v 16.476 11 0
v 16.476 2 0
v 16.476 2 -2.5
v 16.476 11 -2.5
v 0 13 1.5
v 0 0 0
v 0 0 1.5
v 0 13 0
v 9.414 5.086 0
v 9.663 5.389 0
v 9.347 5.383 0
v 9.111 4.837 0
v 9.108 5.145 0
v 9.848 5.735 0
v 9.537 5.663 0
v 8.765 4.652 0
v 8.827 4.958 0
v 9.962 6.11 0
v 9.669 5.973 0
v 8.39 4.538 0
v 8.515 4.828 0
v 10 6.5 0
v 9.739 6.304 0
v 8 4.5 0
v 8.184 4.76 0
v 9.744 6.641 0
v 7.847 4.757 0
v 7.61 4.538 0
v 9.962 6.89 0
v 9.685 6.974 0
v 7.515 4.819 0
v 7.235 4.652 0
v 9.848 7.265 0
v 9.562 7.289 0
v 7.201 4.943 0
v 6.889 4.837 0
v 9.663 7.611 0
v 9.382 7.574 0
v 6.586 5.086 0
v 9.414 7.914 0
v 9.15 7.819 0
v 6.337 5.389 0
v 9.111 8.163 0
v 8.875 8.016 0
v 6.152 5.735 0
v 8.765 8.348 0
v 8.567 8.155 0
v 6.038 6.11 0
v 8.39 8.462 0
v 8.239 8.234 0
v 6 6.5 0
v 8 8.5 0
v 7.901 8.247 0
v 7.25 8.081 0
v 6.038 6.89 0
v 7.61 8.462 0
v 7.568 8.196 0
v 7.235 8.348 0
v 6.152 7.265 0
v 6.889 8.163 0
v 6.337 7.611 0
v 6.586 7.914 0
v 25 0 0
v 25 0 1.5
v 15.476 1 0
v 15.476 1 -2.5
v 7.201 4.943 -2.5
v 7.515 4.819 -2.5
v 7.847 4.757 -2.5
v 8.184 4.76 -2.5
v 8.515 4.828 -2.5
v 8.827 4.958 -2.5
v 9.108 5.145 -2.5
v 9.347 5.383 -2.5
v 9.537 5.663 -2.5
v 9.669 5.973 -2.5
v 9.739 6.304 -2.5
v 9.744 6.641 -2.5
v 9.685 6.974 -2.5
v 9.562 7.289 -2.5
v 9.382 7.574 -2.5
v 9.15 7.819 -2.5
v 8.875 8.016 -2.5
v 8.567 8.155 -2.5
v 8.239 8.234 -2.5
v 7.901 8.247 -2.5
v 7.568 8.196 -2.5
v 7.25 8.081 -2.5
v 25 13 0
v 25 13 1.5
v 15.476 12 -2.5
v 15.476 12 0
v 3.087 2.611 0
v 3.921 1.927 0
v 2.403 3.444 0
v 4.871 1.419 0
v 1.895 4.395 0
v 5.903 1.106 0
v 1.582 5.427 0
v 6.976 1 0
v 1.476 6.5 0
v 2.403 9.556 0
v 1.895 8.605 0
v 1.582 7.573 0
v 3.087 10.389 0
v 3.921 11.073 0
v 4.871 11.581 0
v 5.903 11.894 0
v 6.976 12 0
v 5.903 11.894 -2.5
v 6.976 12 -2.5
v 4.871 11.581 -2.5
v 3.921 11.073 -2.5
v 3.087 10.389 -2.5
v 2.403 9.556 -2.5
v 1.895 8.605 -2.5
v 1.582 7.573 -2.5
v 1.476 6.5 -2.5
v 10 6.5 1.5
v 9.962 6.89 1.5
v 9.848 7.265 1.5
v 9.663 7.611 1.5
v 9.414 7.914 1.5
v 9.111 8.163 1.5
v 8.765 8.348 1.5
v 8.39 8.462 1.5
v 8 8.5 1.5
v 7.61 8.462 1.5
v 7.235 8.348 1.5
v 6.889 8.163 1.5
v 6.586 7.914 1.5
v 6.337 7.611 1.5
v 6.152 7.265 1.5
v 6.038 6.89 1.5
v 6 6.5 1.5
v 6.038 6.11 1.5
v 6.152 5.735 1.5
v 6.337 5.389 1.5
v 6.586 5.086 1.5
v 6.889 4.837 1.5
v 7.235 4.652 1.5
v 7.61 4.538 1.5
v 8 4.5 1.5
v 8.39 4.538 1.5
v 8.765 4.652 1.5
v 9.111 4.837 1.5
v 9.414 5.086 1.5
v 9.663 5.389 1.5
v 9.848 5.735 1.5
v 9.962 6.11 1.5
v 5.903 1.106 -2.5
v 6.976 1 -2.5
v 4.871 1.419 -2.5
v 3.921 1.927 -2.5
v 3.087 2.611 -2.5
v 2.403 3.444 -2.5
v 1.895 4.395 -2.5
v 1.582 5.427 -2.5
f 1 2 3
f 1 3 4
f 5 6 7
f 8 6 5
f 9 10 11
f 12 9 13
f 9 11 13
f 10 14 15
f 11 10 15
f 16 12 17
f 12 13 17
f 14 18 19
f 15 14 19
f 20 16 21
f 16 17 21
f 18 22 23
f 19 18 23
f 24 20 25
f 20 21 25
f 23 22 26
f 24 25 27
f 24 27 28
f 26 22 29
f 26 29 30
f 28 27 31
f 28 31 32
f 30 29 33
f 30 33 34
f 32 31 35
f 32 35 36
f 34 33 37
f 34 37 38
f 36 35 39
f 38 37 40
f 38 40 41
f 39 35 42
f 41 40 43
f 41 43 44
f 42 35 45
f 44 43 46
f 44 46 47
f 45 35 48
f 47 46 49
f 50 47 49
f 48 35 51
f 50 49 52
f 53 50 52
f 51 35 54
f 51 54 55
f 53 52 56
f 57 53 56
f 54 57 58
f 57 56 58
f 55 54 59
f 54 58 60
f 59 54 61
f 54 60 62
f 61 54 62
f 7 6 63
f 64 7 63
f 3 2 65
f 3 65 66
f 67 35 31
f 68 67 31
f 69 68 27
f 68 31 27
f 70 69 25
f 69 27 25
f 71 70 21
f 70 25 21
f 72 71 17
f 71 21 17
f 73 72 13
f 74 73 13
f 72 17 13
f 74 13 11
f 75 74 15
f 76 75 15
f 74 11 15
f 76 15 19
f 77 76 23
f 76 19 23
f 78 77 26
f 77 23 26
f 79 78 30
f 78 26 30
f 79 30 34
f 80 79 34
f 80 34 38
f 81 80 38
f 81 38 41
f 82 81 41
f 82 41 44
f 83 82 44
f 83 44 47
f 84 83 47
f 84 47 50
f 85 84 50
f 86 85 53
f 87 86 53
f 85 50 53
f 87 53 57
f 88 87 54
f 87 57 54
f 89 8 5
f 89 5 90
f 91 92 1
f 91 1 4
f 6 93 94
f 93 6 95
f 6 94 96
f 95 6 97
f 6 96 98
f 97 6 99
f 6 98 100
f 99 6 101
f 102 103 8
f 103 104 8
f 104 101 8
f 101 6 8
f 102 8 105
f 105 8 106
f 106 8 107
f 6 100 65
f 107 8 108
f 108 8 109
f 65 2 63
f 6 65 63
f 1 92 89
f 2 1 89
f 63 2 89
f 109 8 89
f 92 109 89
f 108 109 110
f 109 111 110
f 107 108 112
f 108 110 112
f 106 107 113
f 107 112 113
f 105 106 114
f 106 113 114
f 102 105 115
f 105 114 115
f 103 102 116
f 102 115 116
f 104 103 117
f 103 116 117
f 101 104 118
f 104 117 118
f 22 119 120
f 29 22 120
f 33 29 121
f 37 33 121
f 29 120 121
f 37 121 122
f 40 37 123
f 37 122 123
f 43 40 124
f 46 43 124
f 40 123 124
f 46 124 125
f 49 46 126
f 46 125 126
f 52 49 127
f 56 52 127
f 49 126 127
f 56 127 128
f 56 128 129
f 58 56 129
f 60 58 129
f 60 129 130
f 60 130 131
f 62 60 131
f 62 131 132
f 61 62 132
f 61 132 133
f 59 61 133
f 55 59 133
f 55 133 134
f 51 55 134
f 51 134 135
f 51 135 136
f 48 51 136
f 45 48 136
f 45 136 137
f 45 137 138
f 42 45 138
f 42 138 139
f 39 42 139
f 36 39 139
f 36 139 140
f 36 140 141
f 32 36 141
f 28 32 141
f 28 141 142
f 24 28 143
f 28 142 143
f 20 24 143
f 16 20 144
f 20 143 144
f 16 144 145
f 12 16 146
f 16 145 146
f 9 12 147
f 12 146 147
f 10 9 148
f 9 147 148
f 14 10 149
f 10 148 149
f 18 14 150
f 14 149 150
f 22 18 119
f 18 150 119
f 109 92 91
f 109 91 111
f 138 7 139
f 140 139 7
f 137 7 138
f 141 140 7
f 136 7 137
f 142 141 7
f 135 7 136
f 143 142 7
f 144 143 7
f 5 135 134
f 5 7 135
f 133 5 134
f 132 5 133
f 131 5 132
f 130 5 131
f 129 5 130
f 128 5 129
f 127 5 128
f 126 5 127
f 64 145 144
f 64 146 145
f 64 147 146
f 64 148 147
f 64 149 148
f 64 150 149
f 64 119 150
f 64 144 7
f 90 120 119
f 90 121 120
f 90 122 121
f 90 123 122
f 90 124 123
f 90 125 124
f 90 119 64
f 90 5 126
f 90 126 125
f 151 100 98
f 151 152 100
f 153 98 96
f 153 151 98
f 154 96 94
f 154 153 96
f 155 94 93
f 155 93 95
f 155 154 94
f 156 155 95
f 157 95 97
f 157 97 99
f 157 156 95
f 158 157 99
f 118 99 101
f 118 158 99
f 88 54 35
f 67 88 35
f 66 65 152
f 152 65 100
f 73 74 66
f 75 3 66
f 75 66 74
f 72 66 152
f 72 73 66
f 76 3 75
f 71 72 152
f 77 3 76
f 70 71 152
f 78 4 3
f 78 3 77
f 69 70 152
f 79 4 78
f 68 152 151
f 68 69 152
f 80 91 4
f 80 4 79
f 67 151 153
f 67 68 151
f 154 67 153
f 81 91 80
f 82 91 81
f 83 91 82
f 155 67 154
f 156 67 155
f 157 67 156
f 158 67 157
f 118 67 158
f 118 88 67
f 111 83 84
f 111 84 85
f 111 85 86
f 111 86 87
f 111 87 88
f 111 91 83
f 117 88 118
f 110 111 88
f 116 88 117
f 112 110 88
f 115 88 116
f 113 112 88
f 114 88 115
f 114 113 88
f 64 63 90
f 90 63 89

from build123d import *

# Parameters (mm, degrees)
SKETCH_1_W          = 25
SKETCH_1_H          = 13
EXTRUDE_1_DEPTH     = 1.5
SKETCH_2_R          = 2
CUT_EXTRUDE_1_DEPTH = 2.8
SKETCH_3_W          = 15
SKETCH_3_H          = 11
EXTRUDE_2_DEPTH     = 2.5
FILLET_1_R          = 5.5
CHAMFER_1_SIZE      = 1


with BuildPart() as part:
    # 草图1 → 凸台-拉伸1 (new body)
    with BuildSketch(Plane.XY):
        with Locations((12.5, 6.5)):
            Rectangle(SKETCH_1_W, SKETCH_1_H)
    extrude(amount=EXTRUDE_1_DEPTH)

    # 草图2 → 切除-拉伸1 (cut)
    with BuildSketch(Plane.XY.offset(1.5)):
        with Locations((8, 6.5)):
            Circle(SKETCH_2_R)
    extrude(amount=-CUT_EXTRUDE_1_DEPTH, mode=Mode.SUBTRACT)

    # 草图3 → 凸台-拉伸2 (add)
    with BuildSketch(Plane(origin=(0, 0, 0), x_dir=(-1, 0, 0), z_dir=(0, 0, -1))):
        with Locations((-8.976194502, 6.5)):
            Rectangle(SKETCH_3_W, SKETCH_3_H)
        with BuildLine():
            Line((-7.25, 8.08113883), (-7.200635773, 4.943235139))
            ThreePointArc((-7.200635773, 4.943235139), (-9.749783493, 6.472473116), (-7.25, 8.08113883))
        make_face(mode=Mode.SUBTRACT)
    extrude(amount=EXTRUDE_2_DEPTH)

    # 圆角1
    fillet_1_edges = [part.edges().sort_by_distance(p)[0] for p in [
        (1.476194502, 1, -1.25),
        (1.476194502, 12, -1.25),
    ]]
    fillet(fillet_1_edges, radius=FILLET_1_R - 0.0001)  # a hair under: the kernel refuses the full size

    # 倒角1
    chamfer_1_edges = [part.edges().sort_by_distance(p)[0] for p in [
        (16.476194502, 12, -1.25),
        (16.476194502, 1, -1.25),
    ]]
    chamfer(chamfer_1_edges, length=CHAMFER_1_SIZE)


solid = part.part
